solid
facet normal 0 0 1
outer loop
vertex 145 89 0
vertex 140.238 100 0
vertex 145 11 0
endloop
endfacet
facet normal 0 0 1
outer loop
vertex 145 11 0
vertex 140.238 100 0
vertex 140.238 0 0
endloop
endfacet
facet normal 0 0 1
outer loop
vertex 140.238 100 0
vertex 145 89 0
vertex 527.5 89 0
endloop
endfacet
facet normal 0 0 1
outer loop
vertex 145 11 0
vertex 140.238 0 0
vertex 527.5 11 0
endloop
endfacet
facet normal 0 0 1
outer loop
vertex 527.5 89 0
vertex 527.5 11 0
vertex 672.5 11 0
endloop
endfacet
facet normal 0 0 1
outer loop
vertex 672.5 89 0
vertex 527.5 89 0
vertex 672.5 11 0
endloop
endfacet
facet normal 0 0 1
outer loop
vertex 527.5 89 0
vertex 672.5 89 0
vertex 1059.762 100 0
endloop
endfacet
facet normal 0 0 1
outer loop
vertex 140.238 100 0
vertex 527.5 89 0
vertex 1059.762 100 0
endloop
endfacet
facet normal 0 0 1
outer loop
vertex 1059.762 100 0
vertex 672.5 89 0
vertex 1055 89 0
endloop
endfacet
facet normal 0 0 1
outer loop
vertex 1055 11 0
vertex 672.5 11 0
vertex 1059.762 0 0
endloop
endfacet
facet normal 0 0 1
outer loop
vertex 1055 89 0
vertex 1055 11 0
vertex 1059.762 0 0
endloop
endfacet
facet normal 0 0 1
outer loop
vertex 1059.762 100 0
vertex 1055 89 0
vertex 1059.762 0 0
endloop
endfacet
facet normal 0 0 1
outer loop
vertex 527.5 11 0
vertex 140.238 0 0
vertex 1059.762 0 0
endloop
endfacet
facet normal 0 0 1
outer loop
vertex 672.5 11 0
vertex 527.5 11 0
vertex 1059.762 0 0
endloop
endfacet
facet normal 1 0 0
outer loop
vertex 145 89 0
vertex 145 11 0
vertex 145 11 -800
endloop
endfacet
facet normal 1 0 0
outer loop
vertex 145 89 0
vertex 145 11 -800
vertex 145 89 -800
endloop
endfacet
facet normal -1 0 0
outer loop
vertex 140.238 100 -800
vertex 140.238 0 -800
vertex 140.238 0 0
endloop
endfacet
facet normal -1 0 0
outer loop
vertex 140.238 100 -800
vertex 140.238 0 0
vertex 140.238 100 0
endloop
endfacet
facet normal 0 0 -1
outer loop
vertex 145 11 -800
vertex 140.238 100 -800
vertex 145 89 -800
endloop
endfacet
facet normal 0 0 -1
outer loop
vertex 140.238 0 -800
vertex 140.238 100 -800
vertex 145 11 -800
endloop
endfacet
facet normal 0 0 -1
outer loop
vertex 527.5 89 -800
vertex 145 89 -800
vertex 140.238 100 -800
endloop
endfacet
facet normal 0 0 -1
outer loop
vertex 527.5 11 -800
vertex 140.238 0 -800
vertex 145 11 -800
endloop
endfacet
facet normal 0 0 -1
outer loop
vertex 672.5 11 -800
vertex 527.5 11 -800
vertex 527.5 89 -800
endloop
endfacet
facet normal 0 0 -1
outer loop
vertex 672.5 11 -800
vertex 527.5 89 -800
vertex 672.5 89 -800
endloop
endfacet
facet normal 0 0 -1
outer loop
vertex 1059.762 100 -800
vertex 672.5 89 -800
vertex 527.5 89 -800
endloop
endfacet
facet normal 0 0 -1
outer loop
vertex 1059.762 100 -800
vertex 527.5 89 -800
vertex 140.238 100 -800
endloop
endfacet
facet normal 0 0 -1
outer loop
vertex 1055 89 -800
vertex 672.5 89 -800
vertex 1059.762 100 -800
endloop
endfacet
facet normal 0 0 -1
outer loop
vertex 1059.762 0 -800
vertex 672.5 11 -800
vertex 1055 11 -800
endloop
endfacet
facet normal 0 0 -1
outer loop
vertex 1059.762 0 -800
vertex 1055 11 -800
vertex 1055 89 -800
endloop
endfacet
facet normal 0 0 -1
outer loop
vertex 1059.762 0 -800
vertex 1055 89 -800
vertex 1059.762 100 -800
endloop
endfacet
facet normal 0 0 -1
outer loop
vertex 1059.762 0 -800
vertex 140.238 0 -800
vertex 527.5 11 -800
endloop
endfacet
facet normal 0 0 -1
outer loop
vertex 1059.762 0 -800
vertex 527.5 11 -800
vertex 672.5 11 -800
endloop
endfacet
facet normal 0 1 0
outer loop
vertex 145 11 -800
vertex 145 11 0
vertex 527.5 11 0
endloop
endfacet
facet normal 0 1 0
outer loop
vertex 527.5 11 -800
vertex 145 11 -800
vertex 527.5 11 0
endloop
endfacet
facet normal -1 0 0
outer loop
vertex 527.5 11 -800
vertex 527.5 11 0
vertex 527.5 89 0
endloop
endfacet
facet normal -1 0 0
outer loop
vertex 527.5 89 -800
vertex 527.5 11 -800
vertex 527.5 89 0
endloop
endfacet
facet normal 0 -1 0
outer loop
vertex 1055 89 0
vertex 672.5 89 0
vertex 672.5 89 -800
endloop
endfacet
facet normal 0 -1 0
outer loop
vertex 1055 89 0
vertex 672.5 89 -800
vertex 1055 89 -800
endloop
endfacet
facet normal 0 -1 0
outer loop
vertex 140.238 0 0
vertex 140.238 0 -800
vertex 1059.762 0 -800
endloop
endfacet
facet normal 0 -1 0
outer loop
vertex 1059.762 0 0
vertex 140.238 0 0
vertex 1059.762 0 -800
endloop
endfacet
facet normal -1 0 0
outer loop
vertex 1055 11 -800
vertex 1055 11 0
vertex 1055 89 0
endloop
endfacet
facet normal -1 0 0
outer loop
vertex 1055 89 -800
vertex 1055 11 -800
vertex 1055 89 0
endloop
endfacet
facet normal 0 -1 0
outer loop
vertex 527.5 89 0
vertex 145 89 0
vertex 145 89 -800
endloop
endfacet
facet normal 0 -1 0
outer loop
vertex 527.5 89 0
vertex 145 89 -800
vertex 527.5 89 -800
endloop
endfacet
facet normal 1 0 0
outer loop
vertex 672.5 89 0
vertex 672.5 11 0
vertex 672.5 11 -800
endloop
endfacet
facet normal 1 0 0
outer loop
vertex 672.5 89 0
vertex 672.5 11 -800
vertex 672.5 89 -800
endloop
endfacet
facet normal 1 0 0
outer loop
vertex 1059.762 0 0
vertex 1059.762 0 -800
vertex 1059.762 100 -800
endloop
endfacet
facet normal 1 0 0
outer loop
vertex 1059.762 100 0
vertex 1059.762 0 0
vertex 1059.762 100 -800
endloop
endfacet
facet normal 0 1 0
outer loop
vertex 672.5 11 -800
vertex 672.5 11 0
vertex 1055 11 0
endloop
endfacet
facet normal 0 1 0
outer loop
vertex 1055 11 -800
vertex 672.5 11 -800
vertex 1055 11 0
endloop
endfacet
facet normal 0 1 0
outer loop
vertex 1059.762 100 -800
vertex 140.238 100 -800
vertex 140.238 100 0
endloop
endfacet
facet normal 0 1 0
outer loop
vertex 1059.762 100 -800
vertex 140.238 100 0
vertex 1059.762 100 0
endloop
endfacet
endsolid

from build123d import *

# Parameters (mm, degrees)
CROQUIS1_W              = 1200
CROQUIS1_H              = 800
SALIENTE_EXTRUIR1_DEPTH = 100
CROQUIS2_W              = 382.5
CROQUIS2_H              = 78
CORTAR_EXTRUIR2_DEPTH   = 1446.68322948
CROQUIS3_W              = 140.2375
CROQUIS3_H              = 100
CORTAR_EXTRUIR3_DEPTH   = 1446.68322948


with BuildPart() as part:
    # Croquis1 → Saliente-Extruir1 (new body)
    with BuildSketch(Plane(origin=(0, 0, 0), x_dir=(1, 0, 0), z_dir=(0, 1, 0))):
        with Locations((600, 400)):
            Rectangle(CROQUIS1_W, CROQUIS1_H)
    extrude(amount=SALIENTE_EXTRUIR1_DEPTH)

    # Croquis2 → Cortar-Extruir2 (cut, through all)
    with BuildSketch(Plane.XY):
        with Locations((336.25, 50)):
            Rectangle(CROQUIS2_W, CROQUIS2_H)
        with Locations((863.75, 50)):
            Rectangle(CROQUIS2_W, CROQUIS2_H)
    extrude(amount=-CORTAR_EXTRUIR2_DEPTH, mode=Mode.SUBTRACT)

    # Croquis3 → Cortar-Extruir3 (cut, through all)
    with BuildSketch(Plane.XY):
        with Locations((70.11875, 50)):
            Rectangle(CROQUIS3_W, CROQUIS3_H)
        with Locations((1129.88125, 50)):
            Rectangle(CROQUIS3_W, CROQUIS3_H)
    extrude(amount=-CORTAR_EXTRUIR3_DEPTH, mode=Mode.SUBTRACT)


solid = part.part
